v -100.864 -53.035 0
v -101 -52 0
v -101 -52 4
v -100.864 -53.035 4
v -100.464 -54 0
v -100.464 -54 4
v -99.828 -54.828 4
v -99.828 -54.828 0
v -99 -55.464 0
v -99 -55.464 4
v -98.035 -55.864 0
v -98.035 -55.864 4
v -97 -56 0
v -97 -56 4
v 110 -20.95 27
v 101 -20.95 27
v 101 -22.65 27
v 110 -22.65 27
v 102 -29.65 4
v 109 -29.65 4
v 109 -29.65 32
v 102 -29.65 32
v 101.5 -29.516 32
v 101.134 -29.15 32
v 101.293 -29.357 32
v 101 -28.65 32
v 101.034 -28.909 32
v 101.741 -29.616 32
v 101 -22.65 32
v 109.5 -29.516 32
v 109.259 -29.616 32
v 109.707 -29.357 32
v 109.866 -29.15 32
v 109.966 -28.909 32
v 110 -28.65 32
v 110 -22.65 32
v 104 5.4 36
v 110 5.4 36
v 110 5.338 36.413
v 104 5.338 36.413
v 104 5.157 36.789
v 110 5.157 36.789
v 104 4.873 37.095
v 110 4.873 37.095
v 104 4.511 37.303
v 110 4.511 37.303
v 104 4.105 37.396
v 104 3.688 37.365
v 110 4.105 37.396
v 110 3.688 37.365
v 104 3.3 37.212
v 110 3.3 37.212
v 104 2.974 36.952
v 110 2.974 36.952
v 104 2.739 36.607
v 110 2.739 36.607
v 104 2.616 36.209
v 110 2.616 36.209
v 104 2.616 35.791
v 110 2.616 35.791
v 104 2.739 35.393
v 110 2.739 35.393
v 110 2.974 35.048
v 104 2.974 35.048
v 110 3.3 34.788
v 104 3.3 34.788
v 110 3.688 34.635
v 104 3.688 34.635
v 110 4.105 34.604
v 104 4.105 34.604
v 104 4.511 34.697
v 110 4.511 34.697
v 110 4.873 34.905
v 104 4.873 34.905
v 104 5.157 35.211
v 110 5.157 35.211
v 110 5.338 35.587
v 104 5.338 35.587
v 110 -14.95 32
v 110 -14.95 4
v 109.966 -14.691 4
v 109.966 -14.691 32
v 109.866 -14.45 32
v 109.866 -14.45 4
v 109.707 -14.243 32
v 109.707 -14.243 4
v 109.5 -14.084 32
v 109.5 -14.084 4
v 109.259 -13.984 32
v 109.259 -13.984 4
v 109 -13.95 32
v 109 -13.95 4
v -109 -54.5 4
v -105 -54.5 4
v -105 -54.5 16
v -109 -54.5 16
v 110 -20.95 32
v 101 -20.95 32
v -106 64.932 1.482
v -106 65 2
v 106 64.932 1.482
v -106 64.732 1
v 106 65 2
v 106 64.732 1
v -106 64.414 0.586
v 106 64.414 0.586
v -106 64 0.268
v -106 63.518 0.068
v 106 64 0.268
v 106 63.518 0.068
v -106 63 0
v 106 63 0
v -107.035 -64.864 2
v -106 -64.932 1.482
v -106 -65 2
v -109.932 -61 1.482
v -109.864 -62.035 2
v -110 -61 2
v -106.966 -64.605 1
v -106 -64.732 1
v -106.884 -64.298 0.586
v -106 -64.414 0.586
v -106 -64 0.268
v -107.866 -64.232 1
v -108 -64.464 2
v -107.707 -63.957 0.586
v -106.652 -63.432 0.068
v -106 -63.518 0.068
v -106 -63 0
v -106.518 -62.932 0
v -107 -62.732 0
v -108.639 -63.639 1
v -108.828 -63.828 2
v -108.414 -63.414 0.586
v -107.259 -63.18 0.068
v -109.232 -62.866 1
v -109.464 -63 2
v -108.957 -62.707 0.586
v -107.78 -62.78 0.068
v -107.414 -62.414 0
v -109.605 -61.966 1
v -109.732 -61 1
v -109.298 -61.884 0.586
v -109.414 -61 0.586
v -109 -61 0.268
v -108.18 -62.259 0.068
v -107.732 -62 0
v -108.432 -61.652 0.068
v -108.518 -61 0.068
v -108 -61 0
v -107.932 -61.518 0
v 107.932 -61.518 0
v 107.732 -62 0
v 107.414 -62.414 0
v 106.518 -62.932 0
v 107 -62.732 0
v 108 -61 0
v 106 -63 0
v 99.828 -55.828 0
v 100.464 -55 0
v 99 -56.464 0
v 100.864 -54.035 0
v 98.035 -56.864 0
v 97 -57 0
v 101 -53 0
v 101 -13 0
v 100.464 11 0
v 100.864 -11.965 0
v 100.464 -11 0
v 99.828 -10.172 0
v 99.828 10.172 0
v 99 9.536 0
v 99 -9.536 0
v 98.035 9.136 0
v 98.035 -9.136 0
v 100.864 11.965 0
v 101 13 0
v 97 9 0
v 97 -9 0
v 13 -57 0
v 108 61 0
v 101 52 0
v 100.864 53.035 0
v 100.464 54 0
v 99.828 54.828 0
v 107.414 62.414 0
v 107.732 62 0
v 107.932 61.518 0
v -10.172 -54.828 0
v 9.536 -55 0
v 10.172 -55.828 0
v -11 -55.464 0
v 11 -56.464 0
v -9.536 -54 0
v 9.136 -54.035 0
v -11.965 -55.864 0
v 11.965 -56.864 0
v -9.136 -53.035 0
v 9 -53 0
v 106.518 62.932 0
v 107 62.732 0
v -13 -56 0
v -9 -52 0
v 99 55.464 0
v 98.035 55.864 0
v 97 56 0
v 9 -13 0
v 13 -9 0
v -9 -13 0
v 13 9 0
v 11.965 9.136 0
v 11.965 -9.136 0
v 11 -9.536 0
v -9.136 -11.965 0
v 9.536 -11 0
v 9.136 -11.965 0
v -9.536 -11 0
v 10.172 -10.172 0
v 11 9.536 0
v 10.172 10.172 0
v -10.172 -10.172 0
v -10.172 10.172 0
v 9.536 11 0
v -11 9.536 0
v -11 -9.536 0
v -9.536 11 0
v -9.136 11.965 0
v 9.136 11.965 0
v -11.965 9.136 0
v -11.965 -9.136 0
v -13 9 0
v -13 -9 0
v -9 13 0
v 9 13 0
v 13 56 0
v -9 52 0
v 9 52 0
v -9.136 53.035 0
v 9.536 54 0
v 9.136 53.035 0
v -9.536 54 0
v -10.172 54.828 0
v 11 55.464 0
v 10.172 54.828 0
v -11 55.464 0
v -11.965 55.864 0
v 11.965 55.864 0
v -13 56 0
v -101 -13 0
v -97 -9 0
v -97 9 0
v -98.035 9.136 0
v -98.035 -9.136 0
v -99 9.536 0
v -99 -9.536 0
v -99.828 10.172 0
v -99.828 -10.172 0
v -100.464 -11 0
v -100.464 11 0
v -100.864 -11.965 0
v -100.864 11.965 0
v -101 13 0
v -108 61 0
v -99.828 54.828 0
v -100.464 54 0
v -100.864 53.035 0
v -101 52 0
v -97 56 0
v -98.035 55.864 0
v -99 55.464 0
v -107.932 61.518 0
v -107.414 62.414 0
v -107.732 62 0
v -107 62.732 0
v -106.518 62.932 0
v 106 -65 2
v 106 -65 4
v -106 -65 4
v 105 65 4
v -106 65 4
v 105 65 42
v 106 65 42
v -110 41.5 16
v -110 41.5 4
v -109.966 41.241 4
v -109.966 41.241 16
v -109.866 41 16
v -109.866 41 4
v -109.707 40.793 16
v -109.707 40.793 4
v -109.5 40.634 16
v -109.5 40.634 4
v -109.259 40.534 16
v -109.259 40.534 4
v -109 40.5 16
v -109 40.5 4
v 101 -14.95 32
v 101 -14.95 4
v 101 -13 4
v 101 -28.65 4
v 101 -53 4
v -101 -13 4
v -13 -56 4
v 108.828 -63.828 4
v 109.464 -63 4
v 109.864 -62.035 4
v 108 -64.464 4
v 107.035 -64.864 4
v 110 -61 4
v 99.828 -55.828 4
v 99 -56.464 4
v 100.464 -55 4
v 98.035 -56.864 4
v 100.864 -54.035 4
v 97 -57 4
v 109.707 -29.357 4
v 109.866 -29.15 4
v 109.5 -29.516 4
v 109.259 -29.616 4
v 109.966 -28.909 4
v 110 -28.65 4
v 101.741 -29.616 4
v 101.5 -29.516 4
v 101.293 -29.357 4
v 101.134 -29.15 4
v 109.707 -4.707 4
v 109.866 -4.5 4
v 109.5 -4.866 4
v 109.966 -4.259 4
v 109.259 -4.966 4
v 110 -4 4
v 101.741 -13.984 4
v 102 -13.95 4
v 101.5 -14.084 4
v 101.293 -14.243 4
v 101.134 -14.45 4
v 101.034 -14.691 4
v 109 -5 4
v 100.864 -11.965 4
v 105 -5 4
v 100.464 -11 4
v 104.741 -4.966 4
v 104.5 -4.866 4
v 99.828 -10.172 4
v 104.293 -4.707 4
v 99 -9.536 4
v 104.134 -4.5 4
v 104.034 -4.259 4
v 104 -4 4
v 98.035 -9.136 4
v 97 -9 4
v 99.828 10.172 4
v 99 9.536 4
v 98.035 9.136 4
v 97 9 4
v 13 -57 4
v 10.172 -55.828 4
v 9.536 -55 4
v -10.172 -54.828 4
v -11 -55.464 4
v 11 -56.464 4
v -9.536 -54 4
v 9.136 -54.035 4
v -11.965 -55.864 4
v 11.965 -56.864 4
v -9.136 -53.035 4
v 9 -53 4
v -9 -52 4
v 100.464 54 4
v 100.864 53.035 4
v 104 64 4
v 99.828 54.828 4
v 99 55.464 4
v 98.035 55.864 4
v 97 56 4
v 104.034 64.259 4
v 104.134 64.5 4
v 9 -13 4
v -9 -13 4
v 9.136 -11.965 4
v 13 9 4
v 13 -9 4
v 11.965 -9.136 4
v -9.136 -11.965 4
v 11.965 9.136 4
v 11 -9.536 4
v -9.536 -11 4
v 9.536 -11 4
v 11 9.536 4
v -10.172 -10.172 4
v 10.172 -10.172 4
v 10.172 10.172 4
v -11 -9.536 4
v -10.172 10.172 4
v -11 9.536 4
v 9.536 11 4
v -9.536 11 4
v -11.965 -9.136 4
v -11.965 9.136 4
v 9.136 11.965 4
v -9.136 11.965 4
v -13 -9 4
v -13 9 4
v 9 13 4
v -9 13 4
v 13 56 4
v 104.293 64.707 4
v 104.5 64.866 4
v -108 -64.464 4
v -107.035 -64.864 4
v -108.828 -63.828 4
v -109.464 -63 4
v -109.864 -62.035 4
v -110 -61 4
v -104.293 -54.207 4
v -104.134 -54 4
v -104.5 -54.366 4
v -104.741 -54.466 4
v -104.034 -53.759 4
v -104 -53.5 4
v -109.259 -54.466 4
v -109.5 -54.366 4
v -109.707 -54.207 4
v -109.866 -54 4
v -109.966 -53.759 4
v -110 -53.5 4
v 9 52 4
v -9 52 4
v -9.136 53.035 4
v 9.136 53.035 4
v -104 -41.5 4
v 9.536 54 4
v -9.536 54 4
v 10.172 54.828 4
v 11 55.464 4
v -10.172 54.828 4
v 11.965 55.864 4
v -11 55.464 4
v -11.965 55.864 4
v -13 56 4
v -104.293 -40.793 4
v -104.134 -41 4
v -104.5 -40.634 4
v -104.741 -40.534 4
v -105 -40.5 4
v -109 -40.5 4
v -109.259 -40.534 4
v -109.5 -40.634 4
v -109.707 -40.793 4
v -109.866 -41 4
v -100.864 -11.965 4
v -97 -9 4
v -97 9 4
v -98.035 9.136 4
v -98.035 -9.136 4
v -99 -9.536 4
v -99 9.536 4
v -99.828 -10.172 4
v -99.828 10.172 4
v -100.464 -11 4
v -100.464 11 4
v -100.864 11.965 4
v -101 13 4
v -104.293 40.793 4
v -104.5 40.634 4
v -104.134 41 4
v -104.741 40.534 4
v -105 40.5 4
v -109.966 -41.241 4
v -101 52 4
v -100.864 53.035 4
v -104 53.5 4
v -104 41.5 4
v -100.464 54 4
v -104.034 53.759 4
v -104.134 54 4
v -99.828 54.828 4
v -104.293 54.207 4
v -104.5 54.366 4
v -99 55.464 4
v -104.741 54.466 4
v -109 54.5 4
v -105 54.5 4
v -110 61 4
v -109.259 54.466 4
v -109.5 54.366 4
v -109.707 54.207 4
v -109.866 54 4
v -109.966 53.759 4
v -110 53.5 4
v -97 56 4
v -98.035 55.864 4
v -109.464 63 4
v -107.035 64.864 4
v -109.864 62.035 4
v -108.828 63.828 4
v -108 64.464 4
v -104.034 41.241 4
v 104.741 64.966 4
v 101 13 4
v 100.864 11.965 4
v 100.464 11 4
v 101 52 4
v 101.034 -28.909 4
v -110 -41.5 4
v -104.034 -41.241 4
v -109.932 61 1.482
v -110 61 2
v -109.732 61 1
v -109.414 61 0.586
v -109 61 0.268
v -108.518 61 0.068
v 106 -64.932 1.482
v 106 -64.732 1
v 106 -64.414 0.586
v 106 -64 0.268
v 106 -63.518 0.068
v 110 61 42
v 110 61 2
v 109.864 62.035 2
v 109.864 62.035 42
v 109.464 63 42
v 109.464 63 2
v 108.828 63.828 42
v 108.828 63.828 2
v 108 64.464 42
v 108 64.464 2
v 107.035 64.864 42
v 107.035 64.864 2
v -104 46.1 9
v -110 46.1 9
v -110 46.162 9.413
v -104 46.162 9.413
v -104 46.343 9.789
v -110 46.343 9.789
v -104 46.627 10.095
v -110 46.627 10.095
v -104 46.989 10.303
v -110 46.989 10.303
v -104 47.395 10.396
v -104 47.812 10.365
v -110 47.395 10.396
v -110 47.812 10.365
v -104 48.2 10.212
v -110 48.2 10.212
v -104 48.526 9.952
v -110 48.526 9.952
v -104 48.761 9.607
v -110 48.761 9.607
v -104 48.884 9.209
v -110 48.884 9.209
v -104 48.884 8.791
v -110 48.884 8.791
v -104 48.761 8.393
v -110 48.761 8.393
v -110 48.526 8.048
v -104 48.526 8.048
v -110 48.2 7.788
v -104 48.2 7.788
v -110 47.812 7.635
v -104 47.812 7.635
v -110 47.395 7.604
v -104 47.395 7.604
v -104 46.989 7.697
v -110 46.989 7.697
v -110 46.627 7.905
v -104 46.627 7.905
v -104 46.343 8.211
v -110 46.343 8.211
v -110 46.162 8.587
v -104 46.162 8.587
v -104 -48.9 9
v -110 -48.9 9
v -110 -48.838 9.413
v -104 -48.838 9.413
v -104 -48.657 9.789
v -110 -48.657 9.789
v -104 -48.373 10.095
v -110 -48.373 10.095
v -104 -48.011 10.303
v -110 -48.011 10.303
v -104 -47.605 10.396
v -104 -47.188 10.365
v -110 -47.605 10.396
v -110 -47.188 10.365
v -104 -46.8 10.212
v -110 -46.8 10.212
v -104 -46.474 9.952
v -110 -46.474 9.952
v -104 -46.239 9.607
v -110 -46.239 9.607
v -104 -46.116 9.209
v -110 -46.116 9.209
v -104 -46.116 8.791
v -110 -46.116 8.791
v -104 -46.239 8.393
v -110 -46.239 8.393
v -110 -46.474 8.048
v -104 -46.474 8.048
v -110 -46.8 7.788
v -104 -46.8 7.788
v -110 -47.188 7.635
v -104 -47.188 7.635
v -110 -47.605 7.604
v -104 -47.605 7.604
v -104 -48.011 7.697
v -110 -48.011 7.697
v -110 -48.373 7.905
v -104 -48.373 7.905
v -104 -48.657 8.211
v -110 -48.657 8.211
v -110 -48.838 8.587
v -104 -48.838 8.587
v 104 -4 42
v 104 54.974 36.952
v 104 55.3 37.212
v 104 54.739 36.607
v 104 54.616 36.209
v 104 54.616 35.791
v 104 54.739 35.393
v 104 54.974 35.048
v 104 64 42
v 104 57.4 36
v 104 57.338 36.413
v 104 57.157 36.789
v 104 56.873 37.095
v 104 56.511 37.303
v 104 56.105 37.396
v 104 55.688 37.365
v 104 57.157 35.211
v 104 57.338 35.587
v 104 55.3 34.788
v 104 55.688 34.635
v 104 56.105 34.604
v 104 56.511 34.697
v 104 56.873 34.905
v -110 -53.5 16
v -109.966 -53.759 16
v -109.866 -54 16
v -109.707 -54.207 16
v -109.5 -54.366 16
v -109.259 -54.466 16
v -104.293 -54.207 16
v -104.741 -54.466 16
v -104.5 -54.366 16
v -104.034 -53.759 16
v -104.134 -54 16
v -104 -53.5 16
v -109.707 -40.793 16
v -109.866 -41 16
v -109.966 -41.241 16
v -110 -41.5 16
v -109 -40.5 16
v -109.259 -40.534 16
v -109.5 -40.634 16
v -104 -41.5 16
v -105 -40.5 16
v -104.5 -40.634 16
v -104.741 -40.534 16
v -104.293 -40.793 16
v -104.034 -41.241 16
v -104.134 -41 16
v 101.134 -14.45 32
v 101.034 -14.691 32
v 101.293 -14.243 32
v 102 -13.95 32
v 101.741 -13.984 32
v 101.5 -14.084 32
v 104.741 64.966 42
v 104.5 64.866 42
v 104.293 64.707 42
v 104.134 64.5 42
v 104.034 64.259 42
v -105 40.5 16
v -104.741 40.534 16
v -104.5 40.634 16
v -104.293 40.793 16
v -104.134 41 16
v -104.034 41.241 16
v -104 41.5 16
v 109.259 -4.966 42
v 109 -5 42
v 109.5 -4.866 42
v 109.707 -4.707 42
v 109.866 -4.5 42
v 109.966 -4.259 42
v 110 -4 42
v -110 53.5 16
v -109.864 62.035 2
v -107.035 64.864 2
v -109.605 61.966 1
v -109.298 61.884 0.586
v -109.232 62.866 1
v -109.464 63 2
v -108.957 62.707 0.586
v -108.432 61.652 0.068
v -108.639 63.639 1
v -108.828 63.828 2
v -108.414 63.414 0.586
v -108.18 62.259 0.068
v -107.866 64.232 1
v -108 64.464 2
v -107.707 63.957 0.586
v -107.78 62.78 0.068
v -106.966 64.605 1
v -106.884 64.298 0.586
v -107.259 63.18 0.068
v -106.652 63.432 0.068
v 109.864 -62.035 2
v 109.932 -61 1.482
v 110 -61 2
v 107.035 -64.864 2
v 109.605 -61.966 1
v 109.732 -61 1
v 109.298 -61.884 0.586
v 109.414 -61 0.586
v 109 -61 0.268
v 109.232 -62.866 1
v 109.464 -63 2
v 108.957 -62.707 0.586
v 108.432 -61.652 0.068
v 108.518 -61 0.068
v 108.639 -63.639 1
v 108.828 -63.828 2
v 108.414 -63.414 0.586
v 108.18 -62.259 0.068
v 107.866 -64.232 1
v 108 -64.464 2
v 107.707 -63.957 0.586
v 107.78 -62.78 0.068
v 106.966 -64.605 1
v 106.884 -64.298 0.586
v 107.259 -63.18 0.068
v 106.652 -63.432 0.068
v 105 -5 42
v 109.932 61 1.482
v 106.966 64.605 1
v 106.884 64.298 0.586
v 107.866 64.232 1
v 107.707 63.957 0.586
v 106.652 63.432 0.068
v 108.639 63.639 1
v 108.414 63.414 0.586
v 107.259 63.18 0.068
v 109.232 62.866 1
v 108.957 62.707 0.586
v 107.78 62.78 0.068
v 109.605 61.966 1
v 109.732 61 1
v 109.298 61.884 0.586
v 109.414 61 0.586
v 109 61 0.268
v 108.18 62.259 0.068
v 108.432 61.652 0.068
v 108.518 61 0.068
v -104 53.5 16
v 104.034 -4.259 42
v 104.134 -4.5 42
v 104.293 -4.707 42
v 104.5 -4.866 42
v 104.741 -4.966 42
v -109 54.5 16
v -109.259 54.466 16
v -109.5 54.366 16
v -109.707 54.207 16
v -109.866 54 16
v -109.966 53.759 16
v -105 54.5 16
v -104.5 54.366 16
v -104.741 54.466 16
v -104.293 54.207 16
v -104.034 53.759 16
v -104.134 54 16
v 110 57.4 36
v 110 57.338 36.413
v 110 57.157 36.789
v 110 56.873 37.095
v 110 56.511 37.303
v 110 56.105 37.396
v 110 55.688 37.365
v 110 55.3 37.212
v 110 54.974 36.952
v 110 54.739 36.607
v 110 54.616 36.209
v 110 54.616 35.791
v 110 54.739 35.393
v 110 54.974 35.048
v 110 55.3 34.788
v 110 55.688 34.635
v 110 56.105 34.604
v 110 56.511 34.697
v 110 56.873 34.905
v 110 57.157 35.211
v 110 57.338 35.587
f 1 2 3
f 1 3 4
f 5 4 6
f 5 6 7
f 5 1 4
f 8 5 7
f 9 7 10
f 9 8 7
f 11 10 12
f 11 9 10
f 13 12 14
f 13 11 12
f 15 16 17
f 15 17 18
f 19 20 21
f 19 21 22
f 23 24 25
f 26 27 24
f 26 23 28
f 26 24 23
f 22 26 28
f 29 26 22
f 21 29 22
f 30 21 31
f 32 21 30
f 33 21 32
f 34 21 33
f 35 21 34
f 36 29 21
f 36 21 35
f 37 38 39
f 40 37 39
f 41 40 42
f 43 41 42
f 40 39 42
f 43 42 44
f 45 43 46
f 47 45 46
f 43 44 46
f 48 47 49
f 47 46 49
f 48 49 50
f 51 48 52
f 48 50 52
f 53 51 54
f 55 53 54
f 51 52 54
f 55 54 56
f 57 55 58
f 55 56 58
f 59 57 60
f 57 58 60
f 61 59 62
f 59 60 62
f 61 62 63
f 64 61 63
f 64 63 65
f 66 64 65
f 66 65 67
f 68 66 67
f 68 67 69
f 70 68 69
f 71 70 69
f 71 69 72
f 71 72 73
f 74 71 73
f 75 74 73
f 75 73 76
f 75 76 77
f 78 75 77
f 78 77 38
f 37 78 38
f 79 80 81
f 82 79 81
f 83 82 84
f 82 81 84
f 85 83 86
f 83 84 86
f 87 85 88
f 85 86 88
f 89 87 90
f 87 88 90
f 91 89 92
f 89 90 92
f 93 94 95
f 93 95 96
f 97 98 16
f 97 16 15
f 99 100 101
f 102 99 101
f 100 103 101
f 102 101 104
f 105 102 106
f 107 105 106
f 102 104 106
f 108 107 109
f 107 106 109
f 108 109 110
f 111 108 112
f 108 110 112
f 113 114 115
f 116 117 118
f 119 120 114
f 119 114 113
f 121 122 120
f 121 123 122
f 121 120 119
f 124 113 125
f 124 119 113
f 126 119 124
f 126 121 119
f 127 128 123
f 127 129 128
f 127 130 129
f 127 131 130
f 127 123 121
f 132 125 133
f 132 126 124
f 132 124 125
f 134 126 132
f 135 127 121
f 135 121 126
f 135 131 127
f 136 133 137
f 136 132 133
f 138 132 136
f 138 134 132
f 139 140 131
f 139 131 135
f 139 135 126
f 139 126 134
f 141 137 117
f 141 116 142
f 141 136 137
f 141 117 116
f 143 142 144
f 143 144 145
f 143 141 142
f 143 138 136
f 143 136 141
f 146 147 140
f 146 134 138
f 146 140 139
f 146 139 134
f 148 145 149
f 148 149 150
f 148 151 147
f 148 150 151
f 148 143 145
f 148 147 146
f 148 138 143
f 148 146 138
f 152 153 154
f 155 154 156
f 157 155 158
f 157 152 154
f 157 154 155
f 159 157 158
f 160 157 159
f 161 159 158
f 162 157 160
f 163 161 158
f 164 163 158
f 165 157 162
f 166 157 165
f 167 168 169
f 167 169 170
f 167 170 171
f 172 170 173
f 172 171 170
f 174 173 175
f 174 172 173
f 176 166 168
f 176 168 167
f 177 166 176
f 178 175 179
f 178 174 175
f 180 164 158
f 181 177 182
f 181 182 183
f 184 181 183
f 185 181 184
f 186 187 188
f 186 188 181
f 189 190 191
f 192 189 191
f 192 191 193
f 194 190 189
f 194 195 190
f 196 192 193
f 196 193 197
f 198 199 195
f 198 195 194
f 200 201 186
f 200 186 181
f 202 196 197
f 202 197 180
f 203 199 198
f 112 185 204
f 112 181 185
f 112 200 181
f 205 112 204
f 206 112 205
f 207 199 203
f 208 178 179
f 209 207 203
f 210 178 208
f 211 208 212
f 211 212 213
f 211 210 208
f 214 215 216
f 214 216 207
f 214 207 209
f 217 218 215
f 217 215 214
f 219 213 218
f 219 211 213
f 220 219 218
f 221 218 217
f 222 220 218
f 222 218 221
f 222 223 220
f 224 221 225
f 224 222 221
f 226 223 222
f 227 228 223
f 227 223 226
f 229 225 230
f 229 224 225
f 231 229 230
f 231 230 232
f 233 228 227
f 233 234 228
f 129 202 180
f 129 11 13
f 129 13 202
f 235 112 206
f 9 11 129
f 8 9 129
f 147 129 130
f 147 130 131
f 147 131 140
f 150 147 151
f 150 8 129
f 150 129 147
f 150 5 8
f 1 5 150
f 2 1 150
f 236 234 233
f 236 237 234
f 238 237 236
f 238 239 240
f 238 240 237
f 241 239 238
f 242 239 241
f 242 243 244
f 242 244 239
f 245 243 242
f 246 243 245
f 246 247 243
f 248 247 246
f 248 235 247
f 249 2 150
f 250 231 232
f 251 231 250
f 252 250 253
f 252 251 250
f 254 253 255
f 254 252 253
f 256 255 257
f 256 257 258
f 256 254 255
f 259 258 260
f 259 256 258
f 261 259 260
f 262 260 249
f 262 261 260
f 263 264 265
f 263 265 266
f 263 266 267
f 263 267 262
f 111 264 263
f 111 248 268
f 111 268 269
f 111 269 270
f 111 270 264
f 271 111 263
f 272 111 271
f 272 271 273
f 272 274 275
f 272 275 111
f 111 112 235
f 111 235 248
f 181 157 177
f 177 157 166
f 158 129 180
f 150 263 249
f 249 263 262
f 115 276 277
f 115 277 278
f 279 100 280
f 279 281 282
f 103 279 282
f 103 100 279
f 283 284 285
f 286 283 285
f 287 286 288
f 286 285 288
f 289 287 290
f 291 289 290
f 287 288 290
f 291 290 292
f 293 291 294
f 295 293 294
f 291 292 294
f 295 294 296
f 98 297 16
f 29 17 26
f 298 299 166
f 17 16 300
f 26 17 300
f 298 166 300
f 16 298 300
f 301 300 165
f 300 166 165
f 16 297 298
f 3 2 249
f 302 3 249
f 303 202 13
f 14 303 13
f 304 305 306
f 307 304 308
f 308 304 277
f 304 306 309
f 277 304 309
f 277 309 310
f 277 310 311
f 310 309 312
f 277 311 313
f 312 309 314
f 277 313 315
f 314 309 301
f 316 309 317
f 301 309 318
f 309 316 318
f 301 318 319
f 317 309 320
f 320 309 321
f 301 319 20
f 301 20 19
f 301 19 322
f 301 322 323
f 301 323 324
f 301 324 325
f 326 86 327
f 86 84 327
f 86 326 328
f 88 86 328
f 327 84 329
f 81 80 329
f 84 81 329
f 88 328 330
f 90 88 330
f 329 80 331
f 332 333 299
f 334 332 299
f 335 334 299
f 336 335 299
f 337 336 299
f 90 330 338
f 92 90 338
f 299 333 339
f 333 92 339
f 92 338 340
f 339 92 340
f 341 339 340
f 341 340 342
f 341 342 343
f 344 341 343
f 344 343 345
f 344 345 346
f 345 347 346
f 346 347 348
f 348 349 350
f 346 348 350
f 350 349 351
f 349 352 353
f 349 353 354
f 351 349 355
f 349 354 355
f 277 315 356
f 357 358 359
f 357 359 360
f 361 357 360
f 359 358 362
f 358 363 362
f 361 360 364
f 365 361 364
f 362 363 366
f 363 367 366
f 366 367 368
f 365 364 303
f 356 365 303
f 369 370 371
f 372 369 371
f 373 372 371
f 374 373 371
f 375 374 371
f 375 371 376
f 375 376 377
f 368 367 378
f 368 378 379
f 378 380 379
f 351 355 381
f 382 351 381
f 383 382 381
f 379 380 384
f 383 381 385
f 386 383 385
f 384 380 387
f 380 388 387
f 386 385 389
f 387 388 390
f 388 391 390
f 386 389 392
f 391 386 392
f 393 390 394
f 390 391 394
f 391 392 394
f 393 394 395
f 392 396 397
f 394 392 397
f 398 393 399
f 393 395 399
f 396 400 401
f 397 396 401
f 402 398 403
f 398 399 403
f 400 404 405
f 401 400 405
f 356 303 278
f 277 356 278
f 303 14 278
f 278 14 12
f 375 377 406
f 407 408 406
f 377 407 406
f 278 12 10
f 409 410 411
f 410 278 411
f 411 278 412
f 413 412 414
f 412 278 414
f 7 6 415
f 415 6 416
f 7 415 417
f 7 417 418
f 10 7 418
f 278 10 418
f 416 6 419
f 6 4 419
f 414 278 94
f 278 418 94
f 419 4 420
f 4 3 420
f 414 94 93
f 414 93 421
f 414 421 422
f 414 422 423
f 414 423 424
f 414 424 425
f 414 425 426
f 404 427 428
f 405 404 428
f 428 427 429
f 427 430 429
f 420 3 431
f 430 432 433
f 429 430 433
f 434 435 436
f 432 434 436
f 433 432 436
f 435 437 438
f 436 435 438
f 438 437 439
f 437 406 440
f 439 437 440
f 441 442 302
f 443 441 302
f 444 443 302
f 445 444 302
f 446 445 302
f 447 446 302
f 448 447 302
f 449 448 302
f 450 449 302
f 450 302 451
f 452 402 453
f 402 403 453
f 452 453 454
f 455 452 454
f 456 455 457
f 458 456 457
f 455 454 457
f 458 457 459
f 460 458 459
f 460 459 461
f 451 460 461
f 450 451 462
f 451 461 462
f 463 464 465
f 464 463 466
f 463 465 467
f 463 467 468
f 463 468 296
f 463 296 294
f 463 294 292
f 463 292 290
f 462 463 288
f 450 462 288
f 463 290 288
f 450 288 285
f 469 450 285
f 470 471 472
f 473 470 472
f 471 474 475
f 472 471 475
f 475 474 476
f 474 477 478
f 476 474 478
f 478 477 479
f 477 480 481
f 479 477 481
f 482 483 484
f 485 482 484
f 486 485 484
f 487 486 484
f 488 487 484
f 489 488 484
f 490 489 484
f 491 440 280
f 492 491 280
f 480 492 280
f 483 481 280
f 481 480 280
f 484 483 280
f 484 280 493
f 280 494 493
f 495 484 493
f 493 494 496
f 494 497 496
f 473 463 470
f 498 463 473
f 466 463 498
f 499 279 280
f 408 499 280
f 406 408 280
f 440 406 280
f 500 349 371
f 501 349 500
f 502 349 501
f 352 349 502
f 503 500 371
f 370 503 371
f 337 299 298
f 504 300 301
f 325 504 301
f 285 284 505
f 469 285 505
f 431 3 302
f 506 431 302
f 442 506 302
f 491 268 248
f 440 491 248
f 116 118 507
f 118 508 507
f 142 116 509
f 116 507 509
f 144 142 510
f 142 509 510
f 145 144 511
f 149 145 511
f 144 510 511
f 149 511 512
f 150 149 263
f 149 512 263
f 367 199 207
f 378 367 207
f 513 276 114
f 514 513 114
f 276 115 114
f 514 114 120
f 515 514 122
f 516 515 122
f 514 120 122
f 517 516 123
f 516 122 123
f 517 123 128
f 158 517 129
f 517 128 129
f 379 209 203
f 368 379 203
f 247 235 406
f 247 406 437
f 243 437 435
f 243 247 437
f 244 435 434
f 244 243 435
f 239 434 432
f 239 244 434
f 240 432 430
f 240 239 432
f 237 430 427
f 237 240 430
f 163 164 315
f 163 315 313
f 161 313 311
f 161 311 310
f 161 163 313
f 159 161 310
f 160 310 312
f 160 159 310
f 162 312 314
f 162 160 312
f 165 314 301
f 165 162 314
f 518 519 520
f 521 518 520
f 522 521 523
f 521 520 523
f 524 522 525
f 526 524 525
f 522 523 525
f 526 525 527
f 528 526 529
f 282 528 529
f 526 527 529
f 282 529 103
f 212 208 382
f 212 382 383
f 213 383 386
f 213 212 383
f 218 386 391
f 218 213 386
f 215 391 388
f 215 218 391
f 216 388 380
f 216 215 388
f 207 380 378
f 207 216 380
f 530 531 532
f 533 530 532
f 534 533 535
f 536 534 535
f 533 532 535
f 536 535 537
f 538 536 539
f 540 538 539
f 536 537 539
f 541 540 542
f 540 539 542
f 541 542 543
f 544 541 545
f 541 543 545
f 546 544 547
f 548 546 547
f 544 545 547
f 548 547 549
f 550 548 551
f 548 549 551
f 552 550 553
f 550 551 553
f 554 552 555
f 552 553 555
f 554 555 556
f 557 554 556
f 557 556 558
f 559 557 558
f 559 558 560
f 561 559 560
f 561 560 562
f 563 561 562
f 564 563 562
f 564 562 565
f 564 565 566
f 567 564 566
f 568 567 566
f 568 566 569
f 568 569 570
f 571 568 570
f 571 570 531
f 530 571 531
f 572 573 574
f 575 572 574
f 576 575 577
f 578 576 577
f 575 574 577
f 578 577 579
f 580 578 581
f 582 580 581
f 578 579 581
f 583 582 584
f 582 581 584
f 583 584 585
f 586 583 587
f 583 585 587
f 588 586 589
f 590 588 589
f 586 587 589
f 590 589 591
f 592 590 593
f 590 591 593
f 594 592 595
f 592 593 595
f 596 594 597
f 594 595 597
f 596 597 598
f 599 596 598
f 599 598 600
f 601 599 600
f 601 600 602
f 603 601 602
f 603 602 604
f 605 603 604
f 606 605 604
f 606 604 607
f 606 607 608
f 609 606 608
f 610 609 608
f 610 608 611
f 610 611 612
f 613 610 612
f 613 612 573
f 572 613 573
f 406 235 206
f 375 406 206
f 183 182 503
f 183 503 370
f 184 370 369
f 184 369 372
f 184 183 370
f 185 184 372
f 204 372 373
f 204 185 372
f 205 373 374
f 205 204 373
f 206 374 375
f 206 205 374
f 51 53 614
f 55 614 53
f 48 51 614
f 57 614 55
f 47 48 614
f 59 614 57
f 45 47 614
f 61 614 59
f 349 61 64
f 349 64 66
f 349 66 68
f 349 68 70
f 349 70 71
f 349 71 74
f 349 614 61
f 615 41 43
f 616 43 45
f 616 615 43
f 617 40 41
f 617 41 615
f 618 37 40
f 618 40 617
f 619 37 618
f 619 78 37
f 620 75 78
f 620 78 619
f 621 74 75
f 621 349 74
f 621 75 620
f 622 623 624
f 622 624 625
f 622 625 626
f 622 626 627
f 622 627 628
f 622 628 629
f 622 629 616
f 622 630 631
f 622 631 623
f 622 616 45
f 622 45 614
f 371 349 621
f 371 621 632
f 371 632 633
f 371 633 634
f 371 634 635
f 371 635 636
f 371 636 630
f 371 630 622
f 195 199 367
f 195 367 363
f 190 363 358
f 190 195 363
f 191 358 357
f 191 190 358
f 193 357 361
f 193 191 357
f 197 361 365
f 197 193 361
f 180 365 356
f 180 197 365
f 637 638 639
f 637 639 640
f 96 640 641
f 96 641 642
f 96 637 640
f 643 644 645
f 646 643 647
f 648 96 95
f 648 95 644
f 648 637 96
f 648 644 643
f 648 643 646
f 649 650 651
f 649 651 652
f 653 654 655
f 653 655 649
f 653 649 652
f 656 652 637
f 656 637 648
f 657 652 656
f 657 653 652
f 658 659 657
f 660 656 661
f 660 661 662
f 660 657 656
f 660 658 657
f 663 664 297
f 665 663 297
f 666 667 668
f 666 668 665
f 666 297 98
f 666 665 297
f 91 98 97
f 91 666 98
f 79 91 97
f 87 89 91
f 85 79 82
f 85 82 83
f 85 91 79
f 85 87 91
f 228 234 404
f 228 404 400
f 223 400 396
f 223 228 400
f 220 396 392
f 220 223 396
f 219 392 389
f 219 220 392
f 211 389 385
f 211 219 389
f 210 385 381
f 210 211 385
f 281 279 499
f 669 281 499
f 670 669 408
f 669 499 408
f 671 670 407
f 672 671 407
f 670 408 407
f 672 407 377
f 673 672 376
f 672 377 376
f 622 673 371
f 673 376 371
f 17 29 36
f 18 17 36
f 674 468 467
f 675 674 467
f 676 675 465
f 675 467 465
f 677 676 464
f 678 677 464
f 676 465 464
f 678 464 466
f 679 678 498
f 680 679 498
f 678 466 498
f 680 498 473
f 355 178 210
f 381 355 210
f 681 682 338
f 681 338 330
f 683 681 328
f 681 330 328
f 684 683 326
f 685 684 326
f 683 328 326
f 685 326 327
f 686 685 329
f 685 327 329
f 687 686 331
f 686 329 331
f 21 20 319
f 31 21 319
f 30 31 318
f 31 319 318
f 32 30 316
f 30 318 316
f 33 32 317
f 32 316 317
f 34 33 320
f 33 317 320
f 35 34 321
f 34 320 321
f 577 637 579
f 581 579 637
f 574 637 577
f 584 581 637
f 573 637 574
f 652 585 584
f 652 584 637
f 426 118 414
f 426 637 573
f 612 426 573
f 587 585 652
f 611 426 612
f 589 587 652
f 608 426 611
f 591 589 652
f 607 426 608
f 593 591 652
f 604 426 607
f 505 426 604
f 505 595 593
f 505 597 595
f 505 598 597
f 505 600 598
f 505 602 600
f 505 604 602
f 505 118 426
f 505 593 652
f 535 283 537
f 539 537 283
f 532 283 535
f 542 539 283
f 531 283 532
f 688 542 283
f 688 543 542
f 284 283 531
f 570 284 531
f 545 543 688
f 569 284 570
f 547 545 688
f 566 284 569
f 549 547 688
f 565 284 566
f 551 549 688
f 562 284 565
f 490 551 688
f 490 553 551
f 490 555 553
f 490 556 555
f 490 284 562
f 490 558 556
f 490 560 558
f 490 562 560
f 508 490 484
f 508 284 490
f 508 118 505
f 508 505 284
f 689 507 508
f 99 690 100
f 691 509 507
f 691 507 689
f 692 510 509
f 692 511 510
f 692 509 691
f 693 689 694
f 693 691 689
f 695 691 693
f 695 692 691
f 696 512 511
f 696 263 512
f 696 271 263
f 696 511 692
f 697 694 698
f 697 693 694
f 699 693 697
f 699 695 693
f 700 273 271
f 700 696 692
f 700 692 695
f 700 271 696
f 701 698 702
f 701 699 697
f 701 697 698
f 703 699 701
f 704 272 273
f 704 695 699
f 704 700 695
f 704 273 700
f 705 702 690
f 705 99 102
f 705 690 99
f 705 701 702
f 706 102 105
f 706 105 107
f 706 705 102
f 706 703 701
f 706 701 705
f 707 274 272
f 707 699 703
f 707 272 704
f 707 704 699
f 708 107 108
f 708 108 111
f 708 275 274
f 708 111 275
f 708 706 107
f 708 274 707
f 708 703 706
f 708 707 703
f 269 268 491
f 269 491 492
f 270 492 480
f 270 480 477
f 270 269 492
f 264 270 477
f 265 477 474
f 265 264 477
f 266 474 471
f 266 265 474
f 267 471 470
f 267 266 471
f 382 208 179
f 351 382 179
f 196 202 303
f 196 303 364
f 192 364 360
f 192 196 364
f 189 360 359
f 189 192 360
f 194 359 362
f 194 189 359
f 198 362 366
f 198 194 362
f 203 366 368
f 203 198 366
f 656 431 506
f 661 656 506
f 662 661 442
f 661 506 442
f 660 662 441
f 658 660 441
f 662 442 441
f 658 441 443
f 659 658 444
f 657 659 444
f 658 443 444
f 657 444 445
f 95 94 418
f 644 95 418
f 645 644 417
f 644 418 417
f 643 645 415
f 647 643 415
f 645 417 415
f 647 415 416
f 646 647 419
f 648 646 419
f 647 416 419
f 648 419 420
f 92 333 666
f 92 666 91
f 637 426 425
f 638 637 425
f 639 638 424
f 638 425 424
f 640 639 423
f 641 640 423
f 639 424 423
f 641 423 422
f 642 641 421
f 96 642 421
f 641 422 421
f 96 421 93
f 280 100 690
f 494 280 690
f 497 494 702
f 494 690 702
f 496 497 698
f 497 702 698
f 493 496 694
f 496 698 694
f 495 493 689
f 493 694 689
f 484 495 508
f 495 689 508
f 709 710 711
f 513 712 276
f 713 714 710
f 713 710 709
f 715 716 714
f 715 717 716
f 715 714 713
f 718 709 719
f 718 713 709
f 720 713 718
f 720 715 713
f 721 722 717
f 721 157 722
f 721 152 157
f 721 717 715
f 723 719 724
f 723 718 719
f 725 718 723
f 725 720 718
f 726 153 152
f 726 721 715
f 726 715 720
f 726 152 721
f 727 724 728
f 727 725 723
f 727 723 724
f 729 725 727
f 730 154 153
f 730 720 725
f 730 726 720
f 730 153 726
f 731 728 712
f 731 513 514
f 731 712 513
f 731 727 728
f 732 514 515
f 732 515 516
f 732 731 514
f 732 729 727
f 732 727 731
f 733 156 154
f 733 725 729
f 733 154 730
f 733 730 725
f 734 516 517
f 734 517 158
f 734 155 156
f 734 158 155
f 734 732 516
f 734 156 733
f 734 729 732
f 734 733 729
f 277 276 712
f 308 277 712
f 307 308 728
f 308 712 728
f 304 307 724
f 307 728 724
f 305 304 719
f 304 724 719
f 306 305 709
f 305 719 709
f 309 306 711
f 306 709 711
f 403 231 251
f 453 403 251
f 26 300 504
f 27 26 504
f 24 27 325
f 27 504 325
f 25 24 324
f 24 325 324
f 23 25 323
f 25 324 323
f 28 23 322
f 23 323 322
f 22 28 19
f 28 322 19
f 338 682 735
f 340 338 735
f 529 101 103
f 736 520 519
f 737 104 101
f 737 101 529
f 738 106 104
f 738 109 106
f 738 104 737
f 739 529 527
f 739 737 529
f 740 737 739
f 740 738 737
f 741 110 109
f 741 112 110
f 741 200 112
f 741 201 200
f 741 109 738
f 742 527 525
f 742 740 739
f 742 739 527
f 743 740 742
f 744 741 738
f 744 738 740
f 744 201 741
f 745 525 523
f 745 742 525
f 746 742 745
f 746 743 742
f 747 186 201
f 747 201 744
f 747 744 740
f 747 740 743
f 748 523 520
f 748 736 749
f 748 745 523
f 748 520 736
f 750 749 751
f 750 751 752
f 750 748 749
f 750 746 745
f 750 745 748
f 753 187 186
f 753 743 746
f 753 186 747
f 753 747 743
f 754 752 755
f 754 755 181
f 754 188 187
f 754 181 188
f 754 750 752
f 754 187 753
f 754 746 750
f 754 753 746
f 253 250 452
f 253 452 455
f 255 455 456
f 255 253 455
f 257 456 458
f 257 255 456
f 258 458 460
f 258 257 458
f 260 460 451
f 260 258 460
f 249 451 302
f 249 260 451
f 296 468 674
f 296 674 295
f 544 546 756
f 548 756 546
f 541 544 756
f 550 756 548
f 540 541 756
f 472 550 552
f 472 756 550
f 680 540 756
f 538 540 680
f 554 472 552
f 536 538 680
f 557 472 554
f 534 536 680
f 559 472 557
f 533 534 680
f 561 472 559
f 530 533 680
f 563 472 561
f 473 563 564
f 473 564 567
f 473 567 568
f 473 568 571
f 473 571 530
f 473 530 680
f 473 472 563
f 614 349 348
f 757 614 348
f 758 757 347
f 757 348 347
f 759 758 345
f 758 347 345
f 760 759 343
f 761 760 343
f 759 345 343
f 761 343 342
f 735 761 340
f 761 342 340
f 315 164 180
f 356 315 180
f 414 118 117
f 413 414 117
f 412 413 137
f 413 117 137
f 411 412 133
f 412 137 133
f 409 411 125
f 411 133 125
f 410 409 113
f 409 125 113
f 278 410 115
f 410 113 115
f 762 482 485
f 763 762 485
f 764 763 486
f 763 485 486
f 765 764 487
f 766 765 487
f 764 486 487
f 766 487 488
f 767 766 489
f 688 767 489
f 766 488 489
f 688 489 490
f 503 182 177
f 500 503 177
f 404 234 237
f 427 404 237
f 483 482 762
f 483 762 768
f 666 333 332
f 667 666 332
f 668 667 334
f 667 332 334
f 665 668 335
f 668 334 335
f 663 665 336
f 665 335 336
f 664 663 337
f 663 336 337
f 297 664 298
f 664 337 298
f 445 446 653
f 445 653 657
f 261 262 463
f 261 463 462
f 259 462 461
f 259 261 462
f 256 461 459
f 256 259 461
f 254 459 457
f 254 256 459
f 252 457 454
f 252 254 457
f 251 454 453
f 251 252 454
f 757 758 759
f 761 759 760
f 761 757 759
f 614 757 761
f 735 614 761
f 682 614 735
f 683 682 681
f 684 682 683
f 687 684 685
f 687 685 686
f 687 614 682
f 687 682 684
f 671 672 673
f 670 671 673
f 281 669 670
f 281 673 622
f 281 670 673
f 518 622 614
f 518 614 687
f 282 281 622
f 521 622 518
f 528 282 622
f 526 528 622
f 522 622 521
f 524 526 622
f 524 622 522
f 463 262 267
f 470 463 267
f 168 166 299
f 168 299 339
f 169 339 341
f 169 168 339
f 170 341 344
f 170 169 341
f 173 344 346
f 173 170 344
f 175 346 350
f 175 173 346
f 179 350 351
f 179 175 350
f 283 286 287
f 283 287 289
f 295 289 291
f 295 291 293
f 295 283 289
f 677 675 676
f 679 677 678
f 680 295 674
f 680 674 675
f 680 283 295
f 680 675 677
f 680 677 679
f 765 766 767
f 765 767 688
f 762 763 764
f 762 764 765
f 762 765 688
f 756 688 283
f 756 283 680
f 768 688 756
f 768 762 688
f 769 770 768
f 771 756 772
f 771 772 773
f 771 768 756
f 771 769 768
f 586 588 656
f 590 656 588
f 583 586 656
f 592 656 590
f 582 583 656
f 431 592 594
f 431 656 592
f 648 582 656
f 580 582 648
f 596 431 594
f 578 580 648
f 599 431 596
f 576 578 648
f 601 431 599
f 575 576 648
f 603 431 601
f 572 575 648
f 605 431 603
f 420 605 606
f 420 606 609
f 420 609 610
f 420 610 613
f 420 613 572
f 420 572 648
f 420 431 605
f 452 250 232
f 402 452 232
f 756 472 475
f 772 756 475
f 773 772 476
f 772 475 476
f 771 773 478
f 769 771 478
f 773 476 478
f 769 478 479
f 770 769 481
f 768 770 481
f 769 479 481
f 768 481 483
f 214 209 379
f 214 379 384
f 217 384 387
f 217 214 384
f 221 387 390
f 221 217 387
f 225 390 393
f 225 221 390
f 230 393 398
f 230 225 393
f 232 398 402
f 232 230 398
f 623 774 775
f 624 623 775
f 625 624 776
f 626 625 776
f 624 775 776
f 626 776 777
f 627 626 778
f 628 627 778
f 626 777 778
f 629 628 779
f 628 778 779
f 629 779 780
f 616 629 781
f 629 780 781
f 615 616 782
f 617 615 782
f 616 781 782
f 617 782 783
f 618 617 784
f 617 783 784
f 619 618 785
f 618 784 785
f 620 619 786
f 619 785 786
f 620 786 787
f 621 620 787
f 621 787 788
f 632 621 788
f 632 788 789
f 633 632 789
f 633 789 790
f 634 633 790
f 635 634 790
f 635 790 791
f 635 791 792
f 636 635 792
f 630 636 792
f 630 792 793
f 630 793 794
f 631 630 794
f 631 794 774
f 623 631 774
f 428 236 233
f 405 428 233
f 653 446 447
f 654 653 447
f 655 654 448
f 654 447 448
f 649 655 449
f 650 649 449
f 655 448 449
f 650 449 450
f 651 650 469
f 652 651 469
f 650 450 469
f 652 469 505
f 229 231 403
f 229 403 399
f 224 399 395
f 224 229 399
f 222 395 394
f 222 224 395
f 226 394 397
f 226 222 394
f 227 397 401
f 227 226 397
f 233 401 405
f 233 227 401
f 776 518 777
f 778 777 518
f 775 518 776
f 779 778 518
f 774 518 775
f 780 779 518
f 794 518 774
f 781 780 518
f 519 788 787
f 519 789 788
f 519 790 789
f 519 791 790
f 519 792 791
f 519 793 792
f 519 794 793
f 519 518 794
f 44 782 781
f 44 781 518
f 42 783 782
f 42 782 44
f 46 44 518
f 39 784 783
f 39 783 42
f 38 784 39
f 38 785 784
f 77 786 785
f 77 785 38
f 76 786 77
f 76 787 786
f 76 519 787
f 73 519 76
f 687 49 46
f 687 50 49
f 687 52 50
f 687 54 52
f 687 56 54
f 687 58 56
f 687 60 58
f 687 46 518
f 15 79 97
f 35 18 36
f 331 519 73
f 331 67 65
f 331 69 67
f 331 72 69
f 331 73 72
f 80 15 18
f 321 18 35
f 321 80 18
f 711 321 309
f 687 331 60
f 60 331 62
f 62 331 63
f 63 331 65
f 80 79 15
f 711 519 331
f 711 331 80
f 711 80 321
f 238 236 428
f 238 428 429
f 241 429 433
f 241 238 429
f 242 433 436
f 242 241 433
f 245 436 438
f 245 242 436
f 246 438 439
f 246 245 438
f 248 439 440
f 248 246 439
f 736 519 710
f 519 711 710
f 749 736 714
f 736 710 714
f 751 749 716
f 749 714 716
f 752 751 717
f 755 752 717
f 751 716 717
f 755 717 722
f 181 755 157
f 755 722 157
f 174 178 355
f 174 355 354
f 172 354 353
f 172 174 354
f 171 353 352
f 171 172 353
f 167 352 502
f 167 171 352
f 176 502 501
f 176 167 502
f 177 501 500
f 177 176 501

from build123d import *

# Parameters (mm, degrees)
PAD_DEPTH       = 4
PAD001_DEPTH    = 38
SKETCH007_R     = 1.4
POCKET_DEPTH    = 8
PAD002_DEPTH    = 12
SKETCH009_R     = 1.4
POCKET001_DEPTH = 8
PAD003_DEPTH    = 28
SKETCH011_W     = 9
SKETCH011_H     = 1.7
POCKET002_DEPTH = 5
FILLET_R        = 2


with BuildPart() as part:
    # Sketch → Pad (new body)
    with BuildSketch(Plane.XY):
        with BuildLine():
            Line((-106, 65), (106, 65))
            ThreePointArc((110, 61), (108.828427, 63.828427), (106, 65))
            Line((110, 61), (110, -61))
            ThreePointArc((106, -65), (108.828427, -63.828427), (110, -61))
            Line((106, -65), (-106, -65))
            ThreePointArc((-110, -61), (-108.828427, -63.828427), (-106, -65))
            Line((-110, -61), (-110, 61))
            ThreePointArc((-106, 65), (-108.828427, 63.828427), (-110, 61))
        make_face()
        with BuildLine():
            ThreePointArc((13, -9), (10.171573, -10.171573), (9, -13))
            Line((9, -53), (9, -13))
            ThreePointArc((9, -53), (10.171573, -55.828427), (13, -57))
            Line((97, -57), (13, -57))
            ThreePointArc((97, -57), (99.828427, -55.828427), (101, -53))
            Line((101, -13), (101, -53))
            ThreePointArc((101, -13), (99.828427, -10.171573), (97, -9))
            Line((13, -9), (97, -9))
        make_face(mode=Mode.SUBTRACT)
        with BuildLine():
            ThreePointArc((13, 56), (10.171573, 54.828427), (9, 52))
            Line((9, 13), (9, 52))
            ThreePointArc((9, 13), (10.171573, 10.171573), (13, 9))
            Line((97, 9), (13, 9))
            ThreePointArc((97, 9), (99.828427, 10.171573), (101, 13))
            Line((101, 52), (101, 13))
            ThreePointArc((101, 52), (99.828427, 54.828427), (97, 56))
            Line((13, 56), (97, 56))
        make_face(mode=Mode.SUBTRACT)
        with BuildLine():
            ThreePointArc((-97, 56), (-99.828427, 54.828427), (-101, 52))
            Line((-101, 13), (-101, 52))
            ThreePointArc((-101, 13), (-99.828427, 10.171573), (-97, 9))
            Line((-13, 9), (-97, 9))
            ThreePointArc((-13, 9), (-10.171573, 10.171573), (-9, 13))
            Line((-9, 52), (-9, 13))
            ThreePointArc((-9, 52), (-10.171573, 54.828427), (-13, 56))
            Line((-97, 56), (-13, 56))
        make_face(mode=Mode.SUBTRACT)
        with BuildLine():
            ThreePointArc((-97, -9), (-99.828427, -10.171573), (-101, -13))
            Line((-101, -52), (-101, -13))
            ThreePointArc((-101, -52), (-99.828427, -54.828427), (-97, -56))
            Line((-13, -56), (-97, -56))
            ThreePointArc((-13, -56), (-10.171573, -54.828427), (-9, -52))
            Line((-9, -13), (-9, -52))
            ThreePointArc((-9, -13), (-10.171573, -10.171573), (-13, -9))
            Line((-97, -9), (-13, -9))
        make_face(mode=Mode.SUBTRACT)
    extrude(amount=PAD_DEPTH)

    # Sketch006 (on Face42 of Pad) → Pad001 (join)
    with BuildSketch(Plane.XY.offset(4)):
        with BuildLine():
            ThreePointArc((105, 65), (104.292893, 64.707107), (104, 64))
            Line((104, -4), (104, 64))
            ThreePointArc((104, -4), (104.292893, -4.707107), (105, -5))
            Line((109, -5), (105, -5))
            ThreePointArc((109, -5), (109.707107, -4.707107), (110, -4))
            Line((110, 61), (110, -4))
            ThreePointArc((110, 61), (108.828427, 63.828427), (106, 65))
            Line((105, 65), (106, 65))
        make_face()
    extrude(amount=PAD001_DEPTH)

    # Sketch007 (on Face50 of Pad001) → Pocket (cut)
    with BuildSketch(Plane.YZ.offset(110)):
        with Locations((56, 36)):
            Circle(SKETCH007_R)
        with Locations((4, 36)):
            Circle(SKETCH007_R)
    extrude(amount=-POCKET_DEPTH, mode=Mode.SUBTRACT)

    # Sketch008 (on Face5 of Pocket) → Pad002 (join)
    with BuildSketch(Plane.XY.offset(4)):
        with BuildLine():
            ThreePointArc((-109, 54.5), (-109.707107, 54.207107), (-110, 53.5))
            Line((-110, 41.5), (-110, 53.5))
            ThreePointArc((-110, 41.5), (-109.707107, 40.792893), (-109, 40.5))
            Line((-105, 40.5), (-109, 40.5))
            ThreePointArc((-105, 40.5), (-104.292893, 40.792893), (-104, 41.5))
            Line((-104, 53.5), (-104, 41.5))
            ThreePointArc((-104, 53.5), (-104.292893, 54.207107), (-105, 54.5))
            Line((-109, 54.5), (-105, 54.5))
        make_face()
        with BuildLine():
            ThreePointArc((-109, -40.5), (-109.707107, -40.792893), (-110, -41.5))
            Line((-110, -53.5), (-110, -41.5))
            ThreePointArc((-110, -53.5), (-109.707107, -54.207107), (-109, -54.5))
            Line((-105, -54.5), (-109, -54.5))
            ThreePointArc((-105, -54.5), (-104.292893, -54.207107), (-104, -53.5))
            Line((-104, -41.5), (-104, -53.5))
            ThreePointArc((-104, -41.5), (-104.292893, -40.792893), (-105, -40.5))
            Line((-109, -40.5), (-105, -40.5))
        make_face()
    extrude(amount=PAD002_DEPTH)

    # Sketch009 (on Face7 of Pad002) → Pocket001 (cut)
    with BuildSketch(Plane(origin=(-110, 0, 0), x_dir=(0, -1, 0), z_dir=(-1, 0, 0))):
        with Locations((-47.5, 9)):
            Circle(SKETCH009_R)
        with Locations((47.5, 9)):
            Circle(SKETCH009_R)
    extrude(amount=-POCKET001_DEPTH, mode=Mode.SUBTRACT)

    # Sketch010 (on Face5 of Pocket001) → Pad003 (join)
    with BuildSketch(Plane.XY.offset(4)):
        with BuildLine():
            ThreePointArc((102, -13.95), (101.292893, -14.242893), (101, -14.95))
            Line((101, -28.65), (101, -14.95))
            ThreePointArc((101, -28.65), (101.292893, -29.357107), (102, -29.65))
            Line((109, -29.65), (102, -29.65))
            ThreePointArc((109, -29.65), (109.707107, -29.357107), (110, -28.65))
            Line((110, -14.95), (110, -28.65))
            ThreePointArc((110, -14.95), (109.707107, -14.242893), (109, -13.95))
            Line((102, -13.95), (109, -13.95))
        make_face()
    extrude(amount=PAD003_DEPTH)

    # Sketch011 (on Face82 of Pad003) → Pocket002 (cut)
    with BuildSketch(Plane.XY.offset(32)):
        with Locations((105.5, -21.8)):
            Rectangle(SKETCH011_W, SKETCH011_H)
    extrude(amount=-POCKET002_DEPTH, mode=Mode.SUBTRACT)

    # Fillet
    fillet_edges = [part.edges().sort_by_distance(p)[0] for p in [
        (0, 65, 0),
    ]]
    fillet(fillet_edges, radius=FILLET_R)


solid = part.part
